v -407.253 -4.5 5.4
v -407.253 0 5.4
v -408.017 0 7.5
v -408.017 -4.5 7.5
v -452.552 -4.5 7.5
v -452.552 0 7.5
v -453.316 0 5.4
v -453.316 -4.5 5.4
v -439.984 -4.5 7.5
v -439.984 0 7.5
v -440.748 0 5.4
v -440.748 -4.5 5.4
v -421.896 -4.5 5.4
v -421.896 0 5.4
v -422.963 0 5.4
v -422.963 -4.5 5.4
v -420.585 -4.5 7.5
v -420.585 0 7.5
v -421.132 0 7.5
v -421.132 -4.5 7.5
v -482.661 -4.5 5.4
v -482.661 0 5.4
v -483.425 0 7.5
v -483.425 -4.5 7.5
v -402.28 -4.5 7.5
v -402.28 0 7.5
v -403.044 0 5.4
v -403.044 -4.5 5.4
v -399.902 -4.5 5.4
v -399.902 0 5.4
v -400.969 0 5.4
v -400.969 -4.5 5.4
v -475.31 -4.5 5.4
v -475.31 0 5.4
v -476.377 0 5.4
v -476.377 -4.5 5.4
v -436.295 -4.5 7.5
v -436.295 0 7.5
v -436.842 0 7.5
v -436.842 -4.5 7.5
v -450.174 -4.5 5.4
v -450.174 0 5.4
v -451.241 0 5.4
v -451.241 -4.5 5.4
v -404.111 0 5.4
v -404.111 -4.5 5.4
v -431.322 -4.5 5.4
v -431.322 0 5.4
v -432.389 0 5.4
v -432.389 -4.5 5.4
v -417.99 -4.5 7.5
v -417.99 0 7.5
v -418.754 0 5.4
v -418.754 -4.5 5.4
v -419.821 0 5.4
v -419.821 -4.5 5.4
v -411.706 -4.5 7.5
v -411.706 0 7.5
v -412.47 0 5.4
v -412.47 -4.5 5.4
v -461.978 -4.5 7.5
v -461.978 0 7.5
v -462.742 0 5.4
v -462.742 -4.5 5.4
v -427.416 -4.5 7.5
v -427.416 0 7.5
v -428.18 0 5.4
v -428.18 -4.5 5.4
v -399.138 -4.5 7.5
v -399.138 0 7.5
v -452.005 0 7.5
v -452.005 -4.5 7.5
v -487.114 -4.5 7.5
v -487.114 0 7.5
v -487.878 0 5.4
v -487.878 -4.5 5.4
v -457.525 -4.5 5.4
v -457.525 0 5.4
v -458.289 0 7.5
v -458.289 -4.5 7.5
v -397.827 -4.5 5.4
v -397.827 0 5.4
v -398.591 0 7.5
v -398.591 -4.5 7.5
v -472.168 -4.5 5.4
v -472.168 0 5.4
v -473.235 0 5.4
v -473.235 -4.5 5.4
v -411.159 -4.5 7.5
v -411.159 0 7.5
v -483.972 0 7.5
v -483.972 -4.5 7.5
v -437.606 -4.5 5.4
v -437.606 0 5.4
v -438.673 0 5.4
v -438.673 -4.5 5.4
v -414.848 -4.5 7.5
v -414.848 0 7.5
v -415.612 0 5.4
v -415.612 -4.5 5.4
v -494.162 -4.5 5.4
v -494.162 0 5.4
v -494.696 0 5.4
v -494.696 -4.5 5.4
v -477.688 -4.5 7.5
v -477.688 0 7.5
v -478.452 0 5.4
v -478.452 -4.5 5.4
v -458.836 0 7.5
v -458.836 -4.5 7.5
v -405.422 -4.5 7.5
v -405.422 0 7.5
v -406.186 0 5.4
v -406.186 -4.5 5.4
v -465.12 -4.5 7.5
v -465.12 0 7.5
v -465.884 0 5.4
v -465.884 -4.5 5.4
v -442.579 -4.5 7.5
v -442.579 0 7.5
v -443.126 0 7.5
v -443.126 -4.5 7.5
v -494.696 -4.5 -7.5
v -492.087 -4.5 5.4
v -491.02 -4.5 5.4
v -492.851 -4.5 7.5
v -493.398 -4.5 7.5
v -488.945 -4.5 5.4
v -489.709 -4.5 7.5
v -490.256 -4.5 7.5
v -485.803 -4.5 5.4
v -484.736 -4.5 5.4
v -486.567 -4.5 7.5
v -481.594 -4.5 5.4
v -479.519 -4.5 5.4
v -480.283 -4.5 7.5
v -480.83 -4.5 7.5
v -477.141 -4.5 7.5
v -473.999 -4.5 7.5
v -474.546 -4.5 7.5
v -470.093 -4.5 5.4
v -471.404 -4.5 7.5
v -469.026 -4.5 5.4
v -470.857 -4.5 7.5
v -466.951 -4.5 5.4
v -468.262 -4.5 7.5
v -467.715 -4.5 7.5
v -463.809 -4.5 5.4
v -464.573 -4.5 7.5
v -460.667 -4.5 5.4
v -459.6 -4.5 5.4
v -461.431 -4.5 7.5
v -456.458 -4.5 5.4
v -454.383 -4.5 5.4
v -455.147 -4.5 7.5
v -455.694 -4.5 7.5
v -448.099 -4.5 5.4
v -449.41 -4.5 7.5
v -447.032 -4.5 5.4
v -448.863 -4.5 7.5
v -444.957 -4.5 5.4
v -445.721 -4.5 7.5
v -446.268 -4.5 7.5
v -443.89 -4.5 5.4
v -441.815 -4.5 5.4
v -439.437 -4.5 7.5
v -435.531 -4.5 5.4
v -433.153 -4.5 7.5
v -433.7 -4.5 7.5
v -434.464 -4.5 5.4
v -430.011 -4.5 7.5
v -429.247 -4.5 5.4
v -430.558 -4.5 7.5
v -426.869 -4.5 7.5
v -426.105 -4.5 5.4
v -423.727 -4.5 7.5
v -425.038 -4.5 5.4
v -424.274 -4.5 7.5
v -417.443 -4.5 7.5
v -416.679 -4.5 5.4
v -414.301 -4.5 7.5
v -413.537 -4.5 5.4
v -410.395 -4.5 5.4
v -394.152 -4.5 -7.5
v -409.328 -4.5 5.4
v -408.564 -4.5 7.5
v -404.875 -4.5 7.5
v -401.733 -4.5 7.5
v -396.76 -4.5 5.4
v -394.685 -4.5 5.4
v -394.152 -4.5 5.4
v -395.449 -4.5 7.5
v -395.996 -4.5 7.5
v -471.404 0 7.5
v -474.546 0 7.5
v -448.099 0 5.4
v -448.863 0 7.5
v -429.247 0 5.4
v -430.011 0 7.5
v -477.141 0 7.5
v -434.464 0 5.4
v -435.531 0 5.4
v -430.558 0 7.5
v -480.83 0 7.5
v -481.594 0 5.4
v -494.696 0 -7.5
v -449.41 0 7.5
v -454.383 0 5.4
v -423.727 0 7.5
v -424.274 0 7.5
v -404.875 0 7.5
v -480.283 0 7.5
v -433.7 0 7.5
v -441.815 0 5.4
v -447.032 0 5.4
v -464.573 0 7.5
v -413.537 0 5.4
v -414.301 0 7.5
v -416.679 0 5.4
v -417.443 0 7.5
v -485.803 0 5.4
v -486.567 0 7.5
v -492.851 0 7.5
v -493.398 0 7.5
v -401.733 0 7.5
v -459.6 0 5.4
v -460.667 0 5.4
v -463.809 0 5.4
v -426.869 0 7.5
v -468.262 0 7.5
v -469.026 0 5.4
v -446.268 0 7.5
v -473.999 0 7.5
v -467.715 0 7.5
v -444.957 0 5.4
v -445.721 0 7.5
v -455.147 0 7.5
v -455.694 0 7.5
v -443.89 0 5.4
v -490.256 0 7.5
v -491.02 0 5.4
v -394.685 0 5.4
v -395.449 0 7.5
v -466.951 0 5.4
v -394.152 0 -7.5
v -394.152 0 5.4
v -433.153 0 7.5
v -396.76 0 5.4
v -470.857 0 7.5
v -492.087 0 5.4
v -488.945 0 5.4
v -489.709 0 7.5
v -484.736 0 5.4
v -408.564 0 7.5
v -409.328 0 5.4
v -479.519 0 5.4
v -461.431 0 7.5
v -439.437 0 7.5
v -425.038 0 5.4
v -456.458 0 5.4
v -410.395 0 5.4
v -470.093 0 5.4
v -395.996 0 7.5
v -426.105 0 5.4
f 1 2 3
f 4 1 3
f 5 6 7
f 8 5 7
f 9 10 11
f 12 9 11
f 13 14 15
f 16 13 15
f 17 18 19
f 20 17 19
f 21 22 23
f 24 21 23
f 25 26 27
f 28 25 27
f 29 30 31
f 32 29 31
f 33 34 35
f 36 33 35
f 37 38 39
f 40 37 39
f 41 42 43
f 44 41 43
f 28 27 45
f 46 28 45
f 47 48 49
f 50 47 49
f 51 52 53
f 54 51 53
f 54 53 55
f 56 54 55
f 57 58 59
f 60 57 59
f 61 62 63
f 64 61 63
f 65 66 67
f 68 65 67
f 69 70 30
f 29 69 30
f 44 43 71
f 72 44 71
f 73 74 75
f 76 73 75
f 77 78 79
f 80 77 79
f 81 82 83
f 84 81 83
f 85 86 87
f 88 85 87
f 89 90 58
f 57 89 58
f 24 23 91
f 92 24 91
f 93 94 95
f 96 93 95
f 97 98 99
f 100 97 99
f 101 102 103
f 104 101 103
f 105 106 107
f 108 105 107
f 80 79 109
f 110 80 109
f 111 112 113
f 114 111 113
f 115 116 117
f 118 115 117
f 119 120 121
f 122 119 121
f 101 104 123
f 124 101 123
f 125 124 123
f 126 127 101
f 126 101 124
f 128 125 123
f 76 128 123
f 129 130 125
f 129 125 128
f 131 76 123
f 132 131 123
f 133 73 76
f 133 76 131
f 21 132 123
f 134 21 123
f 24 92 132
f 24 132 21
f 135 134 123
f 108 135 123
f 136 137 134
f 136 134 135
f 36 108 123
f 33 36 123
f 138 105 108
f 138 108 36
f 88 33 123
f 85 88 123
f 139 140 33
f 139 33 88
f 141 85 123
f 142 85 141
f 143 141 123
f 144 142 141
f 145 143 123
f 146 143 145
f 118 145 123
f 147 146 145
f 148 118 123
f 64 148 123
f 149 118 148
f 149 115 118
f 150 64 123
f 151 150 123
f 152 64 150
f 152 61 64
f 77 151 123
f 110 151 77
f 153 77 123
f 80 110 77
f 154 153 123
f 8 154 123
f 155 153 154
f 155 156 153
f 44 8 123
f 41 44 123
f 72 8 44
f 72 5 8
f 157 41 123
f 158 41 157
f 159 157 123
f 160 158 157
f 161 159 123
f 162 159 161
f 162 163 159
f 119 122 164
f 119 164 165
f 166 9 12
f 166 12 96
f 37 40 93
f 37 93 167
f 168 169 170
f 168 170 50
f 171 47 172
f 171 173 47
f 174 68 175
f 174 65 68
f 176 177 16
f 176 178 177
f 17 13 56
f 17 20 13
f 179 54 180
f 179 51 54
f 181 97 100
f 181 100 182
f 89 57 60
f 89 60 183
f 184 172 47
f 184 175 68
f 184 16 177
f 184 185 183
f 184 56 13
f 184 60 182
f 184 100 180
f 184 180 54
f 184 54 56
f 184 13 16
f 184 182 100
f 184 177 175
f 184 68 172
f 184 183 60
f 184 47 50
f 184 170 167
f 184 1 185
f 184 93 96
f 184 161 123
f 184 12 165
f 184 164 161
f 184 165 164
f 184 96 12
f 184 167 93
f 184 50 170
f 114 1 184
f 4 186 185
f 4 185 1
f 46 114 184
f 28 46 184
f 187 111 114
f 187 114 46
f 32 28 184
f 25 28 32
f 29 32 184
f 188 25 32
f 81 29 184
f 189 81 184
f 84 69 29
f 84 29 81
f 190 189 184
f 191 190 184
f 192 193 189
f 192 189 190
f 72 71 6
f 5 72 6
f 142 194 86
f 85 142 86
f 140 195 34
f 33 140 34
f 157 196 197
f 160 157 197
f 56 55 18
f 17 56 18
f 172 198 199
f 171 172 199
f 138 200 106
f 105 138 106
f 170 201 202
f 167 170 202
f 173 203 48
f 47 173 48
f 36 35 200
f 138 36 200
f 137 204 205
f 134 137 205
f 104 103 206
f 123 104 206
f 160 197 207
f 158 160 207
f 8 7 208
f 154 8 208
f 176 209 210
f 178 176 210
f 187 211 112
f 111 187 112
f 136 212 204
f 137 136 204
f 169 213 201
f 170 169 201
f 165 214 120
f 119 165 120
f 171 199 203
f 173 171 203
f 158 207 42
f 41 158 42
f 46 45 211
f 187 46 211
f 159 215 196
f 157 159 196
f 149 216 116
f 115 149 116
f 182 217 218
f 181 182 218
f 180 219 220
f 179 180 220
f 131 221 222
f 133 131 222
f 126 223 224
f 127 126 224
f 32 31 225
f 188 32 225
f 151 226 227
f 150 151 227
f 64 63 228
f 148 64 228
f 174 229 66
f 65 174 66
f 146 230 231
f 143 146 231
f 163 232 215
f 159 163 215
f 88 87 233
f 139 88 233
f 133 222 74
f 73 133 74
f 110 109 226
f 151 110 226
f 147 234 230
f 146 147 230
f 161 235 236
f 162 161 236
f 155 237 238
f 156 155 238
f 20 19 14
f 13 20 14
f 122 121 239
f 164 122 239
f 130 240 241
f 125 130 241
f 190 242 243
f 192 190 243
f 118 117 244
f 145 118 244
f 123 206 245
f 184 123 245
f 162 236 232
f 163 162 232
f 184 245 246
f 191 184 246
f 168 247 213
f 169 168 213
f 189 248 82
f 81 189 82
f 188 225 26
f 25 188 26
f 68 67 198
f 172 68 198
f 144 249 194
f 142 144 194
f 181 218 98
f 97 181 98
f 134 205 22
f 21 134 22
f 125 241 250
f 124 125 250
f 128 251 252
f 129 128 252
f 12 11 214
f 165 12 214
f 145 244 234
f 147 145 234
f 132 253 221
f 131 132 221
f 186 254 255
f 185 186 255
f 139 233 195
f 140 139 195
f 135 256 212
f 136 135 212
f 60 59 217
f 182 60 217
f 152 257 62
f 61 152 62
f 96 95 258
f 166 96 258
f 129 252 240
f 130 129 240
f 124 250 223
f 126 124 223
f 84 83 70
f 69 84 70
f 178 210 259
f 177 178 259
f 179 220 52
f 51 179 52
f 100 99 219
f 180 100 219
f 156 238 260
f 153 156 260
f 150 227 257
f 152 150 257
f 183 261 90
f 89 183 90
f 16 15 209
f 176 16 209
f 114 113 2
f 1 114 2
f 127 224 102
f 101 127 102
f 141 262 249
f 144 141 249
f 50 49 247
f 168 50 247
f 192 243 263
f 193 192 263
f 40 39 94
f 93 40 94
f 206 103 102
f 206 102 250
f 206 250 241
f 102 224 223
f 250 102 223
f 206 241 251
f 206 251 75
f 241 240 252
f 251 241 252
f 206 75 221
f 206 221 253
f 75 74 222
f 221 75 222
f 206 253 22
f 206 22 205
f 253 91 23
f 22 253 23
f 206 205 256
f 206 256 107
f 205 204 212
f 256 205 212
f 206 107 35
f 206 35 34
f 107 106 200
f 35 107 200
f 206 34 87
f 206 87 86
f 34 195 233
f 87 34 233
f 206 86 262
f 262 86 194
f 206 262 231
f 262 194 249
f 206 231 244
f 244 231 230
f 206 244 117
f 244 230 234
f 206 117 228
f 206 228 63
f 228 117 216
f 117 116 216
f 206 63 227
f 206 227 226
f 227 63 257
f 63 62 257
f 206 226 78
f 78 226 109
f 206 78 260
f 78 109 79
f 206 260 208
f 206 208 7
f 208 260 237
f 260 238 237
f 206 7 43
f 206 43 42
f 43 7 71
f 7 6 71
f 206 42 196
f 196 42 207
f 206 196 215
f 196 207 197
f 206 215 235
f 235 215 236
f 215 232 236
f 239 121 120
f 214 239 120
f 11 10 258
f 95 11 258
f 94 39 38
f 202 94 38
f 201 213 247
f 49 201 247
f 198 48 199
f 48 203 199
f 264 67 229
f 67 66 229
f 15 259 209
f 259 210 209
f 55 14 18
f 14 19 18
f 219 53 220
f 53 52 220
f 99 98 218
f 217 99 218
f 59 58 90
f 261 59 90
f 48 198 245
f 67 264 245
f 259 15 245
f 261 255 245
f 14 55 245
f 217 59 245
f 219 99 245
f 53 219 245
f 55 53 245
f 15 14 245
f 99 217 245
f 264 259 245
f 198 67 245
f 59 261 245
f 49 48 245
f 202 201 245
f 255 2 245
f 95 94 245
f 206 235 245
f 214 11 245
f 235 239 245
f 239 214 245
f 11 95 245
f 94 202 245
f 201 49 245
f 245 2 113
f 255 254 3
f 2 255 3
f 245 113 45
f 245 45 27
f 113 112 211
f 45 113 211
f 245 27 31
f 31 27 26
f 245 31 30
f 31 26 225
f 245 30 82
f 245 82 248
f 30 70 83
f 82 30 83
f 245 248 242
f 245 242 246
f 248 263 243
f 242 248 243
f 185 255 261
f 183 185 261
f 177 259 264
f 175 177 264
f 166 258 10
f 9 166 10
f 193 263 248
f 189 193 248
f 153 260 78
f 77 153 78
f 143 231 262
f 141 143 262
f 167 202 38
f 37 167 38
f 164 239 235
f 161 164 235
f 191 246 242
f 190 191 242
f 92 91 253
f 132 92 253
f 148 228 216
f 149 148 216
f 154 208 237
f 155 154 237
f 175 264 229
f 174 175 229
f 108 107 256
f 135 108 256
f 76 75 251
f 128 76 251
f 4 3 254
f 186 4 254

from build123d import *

# Parameters (mm, degrees)
F1_DEPTH = 4.5


with BuildPart() as f1:
    # F0 (on Front) → F1 (new body)
    with BuildSketch(Plane.XZ):
        Polygon((-494.6955, -7.5), (-394.1515, -7.5), (-394.1515, 5.4), (-394.685, 5.4), (-395.449337, 7.5), (-395.995663, 7.5), (-396.76, 5.4), (-397.827, 5.4), (-398.591337, 7.5), (-399.137663, 7.5), (-399.902, 5.4), (-400.969, 5.4), (-401.733337, 7.5), (-402.279663, 7.5), (-403.044, 5.4), (-404.111, 5.4), (-404.875337, 7.5), (-405.421663, 7.5), (-406.186, 5.4), (-407.253, 5.4), (-408.017337, 7.5), (-408.563663, 7.5), (-409.328, 5.4), (-410.395, 5.4), (-411.159337, 7.5), (-411.705663, 7.5), (-412.47, 5.4), (-413.537, 5.4), (-414.301337, 7.5), (-414.847663, 7.5), (-415.612, 5.4), (-416.679, 5.4), (-417.443337, 7.5), (-417.989663, 7.5), (-418.754, 5.4), (-419.821, 5.4), (-420.585337, 7.5), (-421.131663, 7.5), (-421.896, 5.4), (-422.963, 5.4), (-423.727337, 7.5), (-424.273663, 7.5), (-425.038, 5.4), (-426.105, 5.4), (-426.869337, 7.5), (-427.415663, 7.5), (-428.18, 5.4), (-429.247, 5.4), (-430.011337, 7.5), (-430.557663, 7.5), (-431.322, 5.4), (-432.389, 5.4), (-433.153337, 7.5), (-433.699663, 7.5), (-434.464, 5.4), (-435.531, 5.4), (-436.295337, 7.5), (-436.841663, 7.5), (-437.606, 5.4), (-438.673, 5.4), (-439.437337, 7.5), (-439.983663, 7.5), (-440.748, 5.4), (-441.815, 5.4), (-442.579337, 7.5), (-443.125663, 7.5), (-443.89, 5.4), (-444.957, 5.4), (-445.721337, 7.5), (-446.267663, 7.5), (-447.032, 5.4), (-448.099, 5.4), (-448.863337, 7.5), (-449.409663, 7.5), (-450.174, 5.4), (-451.241, 5.4), (-452.005337, 7.5), (-452.551663, 7.5), (-453.316, 5.4), (-454.383, 5.4), (-455.147337, 7.5), (-455.693663, 7.5), (-456.458, 5.4), (-457.525, 5.4), (-458.289337, 7.5), (-458.835663, 7.5), (-459.6, 5.4), (-460.667, 5.4), (-461.431337, 7.5), (-461.977663, 7.5), (-462.742, 5.4), (-463.809, 5.4), (-464.573337, 7.5), (-465.119663, 7.5), (-465.884, 5.4), (-466.951, 5.4), (-467.715337, 7.5), (-468.261663, 7.5), (-469.026, 5.4), (-470.093, 5.4), (-470.857337, 7.5), (-471.403663, 7.5), (-472.168, 5.4), (-473.235, 5.4), (-473.999337, 7.5), (-474.545663, 7.5), (-475.31, 5.4), (-476.377, 5.4), (-477.141337, 7.5), (-477.687663, 7.5), (-478.452, 5.4), (-479.519, 5.4), (-480.283337, 7.5), (-480.829663, 7.5), (-481.594, 5.4), (-482.661, 5.4), (-483.425337, 7.5), (-483.971663, 7.5), (-484.736, 5.4), (-485.803, 5.4), (-486.567337, 7.5), (-487.113663, 7.5), (-487.878, 5.4), (-488.945, 5.4), (-489.709337, 7.5), (-490.255663, 7.5), (-491.02, 5.4), (-492.087, 5.4), (-492.851337, 7.5), (-493.397663, 7.5), (-494.162, 5.4), (-494.6955, 5.4), align=None)
    extrude(amount=F1_DEPTH)


solid = f1.part
